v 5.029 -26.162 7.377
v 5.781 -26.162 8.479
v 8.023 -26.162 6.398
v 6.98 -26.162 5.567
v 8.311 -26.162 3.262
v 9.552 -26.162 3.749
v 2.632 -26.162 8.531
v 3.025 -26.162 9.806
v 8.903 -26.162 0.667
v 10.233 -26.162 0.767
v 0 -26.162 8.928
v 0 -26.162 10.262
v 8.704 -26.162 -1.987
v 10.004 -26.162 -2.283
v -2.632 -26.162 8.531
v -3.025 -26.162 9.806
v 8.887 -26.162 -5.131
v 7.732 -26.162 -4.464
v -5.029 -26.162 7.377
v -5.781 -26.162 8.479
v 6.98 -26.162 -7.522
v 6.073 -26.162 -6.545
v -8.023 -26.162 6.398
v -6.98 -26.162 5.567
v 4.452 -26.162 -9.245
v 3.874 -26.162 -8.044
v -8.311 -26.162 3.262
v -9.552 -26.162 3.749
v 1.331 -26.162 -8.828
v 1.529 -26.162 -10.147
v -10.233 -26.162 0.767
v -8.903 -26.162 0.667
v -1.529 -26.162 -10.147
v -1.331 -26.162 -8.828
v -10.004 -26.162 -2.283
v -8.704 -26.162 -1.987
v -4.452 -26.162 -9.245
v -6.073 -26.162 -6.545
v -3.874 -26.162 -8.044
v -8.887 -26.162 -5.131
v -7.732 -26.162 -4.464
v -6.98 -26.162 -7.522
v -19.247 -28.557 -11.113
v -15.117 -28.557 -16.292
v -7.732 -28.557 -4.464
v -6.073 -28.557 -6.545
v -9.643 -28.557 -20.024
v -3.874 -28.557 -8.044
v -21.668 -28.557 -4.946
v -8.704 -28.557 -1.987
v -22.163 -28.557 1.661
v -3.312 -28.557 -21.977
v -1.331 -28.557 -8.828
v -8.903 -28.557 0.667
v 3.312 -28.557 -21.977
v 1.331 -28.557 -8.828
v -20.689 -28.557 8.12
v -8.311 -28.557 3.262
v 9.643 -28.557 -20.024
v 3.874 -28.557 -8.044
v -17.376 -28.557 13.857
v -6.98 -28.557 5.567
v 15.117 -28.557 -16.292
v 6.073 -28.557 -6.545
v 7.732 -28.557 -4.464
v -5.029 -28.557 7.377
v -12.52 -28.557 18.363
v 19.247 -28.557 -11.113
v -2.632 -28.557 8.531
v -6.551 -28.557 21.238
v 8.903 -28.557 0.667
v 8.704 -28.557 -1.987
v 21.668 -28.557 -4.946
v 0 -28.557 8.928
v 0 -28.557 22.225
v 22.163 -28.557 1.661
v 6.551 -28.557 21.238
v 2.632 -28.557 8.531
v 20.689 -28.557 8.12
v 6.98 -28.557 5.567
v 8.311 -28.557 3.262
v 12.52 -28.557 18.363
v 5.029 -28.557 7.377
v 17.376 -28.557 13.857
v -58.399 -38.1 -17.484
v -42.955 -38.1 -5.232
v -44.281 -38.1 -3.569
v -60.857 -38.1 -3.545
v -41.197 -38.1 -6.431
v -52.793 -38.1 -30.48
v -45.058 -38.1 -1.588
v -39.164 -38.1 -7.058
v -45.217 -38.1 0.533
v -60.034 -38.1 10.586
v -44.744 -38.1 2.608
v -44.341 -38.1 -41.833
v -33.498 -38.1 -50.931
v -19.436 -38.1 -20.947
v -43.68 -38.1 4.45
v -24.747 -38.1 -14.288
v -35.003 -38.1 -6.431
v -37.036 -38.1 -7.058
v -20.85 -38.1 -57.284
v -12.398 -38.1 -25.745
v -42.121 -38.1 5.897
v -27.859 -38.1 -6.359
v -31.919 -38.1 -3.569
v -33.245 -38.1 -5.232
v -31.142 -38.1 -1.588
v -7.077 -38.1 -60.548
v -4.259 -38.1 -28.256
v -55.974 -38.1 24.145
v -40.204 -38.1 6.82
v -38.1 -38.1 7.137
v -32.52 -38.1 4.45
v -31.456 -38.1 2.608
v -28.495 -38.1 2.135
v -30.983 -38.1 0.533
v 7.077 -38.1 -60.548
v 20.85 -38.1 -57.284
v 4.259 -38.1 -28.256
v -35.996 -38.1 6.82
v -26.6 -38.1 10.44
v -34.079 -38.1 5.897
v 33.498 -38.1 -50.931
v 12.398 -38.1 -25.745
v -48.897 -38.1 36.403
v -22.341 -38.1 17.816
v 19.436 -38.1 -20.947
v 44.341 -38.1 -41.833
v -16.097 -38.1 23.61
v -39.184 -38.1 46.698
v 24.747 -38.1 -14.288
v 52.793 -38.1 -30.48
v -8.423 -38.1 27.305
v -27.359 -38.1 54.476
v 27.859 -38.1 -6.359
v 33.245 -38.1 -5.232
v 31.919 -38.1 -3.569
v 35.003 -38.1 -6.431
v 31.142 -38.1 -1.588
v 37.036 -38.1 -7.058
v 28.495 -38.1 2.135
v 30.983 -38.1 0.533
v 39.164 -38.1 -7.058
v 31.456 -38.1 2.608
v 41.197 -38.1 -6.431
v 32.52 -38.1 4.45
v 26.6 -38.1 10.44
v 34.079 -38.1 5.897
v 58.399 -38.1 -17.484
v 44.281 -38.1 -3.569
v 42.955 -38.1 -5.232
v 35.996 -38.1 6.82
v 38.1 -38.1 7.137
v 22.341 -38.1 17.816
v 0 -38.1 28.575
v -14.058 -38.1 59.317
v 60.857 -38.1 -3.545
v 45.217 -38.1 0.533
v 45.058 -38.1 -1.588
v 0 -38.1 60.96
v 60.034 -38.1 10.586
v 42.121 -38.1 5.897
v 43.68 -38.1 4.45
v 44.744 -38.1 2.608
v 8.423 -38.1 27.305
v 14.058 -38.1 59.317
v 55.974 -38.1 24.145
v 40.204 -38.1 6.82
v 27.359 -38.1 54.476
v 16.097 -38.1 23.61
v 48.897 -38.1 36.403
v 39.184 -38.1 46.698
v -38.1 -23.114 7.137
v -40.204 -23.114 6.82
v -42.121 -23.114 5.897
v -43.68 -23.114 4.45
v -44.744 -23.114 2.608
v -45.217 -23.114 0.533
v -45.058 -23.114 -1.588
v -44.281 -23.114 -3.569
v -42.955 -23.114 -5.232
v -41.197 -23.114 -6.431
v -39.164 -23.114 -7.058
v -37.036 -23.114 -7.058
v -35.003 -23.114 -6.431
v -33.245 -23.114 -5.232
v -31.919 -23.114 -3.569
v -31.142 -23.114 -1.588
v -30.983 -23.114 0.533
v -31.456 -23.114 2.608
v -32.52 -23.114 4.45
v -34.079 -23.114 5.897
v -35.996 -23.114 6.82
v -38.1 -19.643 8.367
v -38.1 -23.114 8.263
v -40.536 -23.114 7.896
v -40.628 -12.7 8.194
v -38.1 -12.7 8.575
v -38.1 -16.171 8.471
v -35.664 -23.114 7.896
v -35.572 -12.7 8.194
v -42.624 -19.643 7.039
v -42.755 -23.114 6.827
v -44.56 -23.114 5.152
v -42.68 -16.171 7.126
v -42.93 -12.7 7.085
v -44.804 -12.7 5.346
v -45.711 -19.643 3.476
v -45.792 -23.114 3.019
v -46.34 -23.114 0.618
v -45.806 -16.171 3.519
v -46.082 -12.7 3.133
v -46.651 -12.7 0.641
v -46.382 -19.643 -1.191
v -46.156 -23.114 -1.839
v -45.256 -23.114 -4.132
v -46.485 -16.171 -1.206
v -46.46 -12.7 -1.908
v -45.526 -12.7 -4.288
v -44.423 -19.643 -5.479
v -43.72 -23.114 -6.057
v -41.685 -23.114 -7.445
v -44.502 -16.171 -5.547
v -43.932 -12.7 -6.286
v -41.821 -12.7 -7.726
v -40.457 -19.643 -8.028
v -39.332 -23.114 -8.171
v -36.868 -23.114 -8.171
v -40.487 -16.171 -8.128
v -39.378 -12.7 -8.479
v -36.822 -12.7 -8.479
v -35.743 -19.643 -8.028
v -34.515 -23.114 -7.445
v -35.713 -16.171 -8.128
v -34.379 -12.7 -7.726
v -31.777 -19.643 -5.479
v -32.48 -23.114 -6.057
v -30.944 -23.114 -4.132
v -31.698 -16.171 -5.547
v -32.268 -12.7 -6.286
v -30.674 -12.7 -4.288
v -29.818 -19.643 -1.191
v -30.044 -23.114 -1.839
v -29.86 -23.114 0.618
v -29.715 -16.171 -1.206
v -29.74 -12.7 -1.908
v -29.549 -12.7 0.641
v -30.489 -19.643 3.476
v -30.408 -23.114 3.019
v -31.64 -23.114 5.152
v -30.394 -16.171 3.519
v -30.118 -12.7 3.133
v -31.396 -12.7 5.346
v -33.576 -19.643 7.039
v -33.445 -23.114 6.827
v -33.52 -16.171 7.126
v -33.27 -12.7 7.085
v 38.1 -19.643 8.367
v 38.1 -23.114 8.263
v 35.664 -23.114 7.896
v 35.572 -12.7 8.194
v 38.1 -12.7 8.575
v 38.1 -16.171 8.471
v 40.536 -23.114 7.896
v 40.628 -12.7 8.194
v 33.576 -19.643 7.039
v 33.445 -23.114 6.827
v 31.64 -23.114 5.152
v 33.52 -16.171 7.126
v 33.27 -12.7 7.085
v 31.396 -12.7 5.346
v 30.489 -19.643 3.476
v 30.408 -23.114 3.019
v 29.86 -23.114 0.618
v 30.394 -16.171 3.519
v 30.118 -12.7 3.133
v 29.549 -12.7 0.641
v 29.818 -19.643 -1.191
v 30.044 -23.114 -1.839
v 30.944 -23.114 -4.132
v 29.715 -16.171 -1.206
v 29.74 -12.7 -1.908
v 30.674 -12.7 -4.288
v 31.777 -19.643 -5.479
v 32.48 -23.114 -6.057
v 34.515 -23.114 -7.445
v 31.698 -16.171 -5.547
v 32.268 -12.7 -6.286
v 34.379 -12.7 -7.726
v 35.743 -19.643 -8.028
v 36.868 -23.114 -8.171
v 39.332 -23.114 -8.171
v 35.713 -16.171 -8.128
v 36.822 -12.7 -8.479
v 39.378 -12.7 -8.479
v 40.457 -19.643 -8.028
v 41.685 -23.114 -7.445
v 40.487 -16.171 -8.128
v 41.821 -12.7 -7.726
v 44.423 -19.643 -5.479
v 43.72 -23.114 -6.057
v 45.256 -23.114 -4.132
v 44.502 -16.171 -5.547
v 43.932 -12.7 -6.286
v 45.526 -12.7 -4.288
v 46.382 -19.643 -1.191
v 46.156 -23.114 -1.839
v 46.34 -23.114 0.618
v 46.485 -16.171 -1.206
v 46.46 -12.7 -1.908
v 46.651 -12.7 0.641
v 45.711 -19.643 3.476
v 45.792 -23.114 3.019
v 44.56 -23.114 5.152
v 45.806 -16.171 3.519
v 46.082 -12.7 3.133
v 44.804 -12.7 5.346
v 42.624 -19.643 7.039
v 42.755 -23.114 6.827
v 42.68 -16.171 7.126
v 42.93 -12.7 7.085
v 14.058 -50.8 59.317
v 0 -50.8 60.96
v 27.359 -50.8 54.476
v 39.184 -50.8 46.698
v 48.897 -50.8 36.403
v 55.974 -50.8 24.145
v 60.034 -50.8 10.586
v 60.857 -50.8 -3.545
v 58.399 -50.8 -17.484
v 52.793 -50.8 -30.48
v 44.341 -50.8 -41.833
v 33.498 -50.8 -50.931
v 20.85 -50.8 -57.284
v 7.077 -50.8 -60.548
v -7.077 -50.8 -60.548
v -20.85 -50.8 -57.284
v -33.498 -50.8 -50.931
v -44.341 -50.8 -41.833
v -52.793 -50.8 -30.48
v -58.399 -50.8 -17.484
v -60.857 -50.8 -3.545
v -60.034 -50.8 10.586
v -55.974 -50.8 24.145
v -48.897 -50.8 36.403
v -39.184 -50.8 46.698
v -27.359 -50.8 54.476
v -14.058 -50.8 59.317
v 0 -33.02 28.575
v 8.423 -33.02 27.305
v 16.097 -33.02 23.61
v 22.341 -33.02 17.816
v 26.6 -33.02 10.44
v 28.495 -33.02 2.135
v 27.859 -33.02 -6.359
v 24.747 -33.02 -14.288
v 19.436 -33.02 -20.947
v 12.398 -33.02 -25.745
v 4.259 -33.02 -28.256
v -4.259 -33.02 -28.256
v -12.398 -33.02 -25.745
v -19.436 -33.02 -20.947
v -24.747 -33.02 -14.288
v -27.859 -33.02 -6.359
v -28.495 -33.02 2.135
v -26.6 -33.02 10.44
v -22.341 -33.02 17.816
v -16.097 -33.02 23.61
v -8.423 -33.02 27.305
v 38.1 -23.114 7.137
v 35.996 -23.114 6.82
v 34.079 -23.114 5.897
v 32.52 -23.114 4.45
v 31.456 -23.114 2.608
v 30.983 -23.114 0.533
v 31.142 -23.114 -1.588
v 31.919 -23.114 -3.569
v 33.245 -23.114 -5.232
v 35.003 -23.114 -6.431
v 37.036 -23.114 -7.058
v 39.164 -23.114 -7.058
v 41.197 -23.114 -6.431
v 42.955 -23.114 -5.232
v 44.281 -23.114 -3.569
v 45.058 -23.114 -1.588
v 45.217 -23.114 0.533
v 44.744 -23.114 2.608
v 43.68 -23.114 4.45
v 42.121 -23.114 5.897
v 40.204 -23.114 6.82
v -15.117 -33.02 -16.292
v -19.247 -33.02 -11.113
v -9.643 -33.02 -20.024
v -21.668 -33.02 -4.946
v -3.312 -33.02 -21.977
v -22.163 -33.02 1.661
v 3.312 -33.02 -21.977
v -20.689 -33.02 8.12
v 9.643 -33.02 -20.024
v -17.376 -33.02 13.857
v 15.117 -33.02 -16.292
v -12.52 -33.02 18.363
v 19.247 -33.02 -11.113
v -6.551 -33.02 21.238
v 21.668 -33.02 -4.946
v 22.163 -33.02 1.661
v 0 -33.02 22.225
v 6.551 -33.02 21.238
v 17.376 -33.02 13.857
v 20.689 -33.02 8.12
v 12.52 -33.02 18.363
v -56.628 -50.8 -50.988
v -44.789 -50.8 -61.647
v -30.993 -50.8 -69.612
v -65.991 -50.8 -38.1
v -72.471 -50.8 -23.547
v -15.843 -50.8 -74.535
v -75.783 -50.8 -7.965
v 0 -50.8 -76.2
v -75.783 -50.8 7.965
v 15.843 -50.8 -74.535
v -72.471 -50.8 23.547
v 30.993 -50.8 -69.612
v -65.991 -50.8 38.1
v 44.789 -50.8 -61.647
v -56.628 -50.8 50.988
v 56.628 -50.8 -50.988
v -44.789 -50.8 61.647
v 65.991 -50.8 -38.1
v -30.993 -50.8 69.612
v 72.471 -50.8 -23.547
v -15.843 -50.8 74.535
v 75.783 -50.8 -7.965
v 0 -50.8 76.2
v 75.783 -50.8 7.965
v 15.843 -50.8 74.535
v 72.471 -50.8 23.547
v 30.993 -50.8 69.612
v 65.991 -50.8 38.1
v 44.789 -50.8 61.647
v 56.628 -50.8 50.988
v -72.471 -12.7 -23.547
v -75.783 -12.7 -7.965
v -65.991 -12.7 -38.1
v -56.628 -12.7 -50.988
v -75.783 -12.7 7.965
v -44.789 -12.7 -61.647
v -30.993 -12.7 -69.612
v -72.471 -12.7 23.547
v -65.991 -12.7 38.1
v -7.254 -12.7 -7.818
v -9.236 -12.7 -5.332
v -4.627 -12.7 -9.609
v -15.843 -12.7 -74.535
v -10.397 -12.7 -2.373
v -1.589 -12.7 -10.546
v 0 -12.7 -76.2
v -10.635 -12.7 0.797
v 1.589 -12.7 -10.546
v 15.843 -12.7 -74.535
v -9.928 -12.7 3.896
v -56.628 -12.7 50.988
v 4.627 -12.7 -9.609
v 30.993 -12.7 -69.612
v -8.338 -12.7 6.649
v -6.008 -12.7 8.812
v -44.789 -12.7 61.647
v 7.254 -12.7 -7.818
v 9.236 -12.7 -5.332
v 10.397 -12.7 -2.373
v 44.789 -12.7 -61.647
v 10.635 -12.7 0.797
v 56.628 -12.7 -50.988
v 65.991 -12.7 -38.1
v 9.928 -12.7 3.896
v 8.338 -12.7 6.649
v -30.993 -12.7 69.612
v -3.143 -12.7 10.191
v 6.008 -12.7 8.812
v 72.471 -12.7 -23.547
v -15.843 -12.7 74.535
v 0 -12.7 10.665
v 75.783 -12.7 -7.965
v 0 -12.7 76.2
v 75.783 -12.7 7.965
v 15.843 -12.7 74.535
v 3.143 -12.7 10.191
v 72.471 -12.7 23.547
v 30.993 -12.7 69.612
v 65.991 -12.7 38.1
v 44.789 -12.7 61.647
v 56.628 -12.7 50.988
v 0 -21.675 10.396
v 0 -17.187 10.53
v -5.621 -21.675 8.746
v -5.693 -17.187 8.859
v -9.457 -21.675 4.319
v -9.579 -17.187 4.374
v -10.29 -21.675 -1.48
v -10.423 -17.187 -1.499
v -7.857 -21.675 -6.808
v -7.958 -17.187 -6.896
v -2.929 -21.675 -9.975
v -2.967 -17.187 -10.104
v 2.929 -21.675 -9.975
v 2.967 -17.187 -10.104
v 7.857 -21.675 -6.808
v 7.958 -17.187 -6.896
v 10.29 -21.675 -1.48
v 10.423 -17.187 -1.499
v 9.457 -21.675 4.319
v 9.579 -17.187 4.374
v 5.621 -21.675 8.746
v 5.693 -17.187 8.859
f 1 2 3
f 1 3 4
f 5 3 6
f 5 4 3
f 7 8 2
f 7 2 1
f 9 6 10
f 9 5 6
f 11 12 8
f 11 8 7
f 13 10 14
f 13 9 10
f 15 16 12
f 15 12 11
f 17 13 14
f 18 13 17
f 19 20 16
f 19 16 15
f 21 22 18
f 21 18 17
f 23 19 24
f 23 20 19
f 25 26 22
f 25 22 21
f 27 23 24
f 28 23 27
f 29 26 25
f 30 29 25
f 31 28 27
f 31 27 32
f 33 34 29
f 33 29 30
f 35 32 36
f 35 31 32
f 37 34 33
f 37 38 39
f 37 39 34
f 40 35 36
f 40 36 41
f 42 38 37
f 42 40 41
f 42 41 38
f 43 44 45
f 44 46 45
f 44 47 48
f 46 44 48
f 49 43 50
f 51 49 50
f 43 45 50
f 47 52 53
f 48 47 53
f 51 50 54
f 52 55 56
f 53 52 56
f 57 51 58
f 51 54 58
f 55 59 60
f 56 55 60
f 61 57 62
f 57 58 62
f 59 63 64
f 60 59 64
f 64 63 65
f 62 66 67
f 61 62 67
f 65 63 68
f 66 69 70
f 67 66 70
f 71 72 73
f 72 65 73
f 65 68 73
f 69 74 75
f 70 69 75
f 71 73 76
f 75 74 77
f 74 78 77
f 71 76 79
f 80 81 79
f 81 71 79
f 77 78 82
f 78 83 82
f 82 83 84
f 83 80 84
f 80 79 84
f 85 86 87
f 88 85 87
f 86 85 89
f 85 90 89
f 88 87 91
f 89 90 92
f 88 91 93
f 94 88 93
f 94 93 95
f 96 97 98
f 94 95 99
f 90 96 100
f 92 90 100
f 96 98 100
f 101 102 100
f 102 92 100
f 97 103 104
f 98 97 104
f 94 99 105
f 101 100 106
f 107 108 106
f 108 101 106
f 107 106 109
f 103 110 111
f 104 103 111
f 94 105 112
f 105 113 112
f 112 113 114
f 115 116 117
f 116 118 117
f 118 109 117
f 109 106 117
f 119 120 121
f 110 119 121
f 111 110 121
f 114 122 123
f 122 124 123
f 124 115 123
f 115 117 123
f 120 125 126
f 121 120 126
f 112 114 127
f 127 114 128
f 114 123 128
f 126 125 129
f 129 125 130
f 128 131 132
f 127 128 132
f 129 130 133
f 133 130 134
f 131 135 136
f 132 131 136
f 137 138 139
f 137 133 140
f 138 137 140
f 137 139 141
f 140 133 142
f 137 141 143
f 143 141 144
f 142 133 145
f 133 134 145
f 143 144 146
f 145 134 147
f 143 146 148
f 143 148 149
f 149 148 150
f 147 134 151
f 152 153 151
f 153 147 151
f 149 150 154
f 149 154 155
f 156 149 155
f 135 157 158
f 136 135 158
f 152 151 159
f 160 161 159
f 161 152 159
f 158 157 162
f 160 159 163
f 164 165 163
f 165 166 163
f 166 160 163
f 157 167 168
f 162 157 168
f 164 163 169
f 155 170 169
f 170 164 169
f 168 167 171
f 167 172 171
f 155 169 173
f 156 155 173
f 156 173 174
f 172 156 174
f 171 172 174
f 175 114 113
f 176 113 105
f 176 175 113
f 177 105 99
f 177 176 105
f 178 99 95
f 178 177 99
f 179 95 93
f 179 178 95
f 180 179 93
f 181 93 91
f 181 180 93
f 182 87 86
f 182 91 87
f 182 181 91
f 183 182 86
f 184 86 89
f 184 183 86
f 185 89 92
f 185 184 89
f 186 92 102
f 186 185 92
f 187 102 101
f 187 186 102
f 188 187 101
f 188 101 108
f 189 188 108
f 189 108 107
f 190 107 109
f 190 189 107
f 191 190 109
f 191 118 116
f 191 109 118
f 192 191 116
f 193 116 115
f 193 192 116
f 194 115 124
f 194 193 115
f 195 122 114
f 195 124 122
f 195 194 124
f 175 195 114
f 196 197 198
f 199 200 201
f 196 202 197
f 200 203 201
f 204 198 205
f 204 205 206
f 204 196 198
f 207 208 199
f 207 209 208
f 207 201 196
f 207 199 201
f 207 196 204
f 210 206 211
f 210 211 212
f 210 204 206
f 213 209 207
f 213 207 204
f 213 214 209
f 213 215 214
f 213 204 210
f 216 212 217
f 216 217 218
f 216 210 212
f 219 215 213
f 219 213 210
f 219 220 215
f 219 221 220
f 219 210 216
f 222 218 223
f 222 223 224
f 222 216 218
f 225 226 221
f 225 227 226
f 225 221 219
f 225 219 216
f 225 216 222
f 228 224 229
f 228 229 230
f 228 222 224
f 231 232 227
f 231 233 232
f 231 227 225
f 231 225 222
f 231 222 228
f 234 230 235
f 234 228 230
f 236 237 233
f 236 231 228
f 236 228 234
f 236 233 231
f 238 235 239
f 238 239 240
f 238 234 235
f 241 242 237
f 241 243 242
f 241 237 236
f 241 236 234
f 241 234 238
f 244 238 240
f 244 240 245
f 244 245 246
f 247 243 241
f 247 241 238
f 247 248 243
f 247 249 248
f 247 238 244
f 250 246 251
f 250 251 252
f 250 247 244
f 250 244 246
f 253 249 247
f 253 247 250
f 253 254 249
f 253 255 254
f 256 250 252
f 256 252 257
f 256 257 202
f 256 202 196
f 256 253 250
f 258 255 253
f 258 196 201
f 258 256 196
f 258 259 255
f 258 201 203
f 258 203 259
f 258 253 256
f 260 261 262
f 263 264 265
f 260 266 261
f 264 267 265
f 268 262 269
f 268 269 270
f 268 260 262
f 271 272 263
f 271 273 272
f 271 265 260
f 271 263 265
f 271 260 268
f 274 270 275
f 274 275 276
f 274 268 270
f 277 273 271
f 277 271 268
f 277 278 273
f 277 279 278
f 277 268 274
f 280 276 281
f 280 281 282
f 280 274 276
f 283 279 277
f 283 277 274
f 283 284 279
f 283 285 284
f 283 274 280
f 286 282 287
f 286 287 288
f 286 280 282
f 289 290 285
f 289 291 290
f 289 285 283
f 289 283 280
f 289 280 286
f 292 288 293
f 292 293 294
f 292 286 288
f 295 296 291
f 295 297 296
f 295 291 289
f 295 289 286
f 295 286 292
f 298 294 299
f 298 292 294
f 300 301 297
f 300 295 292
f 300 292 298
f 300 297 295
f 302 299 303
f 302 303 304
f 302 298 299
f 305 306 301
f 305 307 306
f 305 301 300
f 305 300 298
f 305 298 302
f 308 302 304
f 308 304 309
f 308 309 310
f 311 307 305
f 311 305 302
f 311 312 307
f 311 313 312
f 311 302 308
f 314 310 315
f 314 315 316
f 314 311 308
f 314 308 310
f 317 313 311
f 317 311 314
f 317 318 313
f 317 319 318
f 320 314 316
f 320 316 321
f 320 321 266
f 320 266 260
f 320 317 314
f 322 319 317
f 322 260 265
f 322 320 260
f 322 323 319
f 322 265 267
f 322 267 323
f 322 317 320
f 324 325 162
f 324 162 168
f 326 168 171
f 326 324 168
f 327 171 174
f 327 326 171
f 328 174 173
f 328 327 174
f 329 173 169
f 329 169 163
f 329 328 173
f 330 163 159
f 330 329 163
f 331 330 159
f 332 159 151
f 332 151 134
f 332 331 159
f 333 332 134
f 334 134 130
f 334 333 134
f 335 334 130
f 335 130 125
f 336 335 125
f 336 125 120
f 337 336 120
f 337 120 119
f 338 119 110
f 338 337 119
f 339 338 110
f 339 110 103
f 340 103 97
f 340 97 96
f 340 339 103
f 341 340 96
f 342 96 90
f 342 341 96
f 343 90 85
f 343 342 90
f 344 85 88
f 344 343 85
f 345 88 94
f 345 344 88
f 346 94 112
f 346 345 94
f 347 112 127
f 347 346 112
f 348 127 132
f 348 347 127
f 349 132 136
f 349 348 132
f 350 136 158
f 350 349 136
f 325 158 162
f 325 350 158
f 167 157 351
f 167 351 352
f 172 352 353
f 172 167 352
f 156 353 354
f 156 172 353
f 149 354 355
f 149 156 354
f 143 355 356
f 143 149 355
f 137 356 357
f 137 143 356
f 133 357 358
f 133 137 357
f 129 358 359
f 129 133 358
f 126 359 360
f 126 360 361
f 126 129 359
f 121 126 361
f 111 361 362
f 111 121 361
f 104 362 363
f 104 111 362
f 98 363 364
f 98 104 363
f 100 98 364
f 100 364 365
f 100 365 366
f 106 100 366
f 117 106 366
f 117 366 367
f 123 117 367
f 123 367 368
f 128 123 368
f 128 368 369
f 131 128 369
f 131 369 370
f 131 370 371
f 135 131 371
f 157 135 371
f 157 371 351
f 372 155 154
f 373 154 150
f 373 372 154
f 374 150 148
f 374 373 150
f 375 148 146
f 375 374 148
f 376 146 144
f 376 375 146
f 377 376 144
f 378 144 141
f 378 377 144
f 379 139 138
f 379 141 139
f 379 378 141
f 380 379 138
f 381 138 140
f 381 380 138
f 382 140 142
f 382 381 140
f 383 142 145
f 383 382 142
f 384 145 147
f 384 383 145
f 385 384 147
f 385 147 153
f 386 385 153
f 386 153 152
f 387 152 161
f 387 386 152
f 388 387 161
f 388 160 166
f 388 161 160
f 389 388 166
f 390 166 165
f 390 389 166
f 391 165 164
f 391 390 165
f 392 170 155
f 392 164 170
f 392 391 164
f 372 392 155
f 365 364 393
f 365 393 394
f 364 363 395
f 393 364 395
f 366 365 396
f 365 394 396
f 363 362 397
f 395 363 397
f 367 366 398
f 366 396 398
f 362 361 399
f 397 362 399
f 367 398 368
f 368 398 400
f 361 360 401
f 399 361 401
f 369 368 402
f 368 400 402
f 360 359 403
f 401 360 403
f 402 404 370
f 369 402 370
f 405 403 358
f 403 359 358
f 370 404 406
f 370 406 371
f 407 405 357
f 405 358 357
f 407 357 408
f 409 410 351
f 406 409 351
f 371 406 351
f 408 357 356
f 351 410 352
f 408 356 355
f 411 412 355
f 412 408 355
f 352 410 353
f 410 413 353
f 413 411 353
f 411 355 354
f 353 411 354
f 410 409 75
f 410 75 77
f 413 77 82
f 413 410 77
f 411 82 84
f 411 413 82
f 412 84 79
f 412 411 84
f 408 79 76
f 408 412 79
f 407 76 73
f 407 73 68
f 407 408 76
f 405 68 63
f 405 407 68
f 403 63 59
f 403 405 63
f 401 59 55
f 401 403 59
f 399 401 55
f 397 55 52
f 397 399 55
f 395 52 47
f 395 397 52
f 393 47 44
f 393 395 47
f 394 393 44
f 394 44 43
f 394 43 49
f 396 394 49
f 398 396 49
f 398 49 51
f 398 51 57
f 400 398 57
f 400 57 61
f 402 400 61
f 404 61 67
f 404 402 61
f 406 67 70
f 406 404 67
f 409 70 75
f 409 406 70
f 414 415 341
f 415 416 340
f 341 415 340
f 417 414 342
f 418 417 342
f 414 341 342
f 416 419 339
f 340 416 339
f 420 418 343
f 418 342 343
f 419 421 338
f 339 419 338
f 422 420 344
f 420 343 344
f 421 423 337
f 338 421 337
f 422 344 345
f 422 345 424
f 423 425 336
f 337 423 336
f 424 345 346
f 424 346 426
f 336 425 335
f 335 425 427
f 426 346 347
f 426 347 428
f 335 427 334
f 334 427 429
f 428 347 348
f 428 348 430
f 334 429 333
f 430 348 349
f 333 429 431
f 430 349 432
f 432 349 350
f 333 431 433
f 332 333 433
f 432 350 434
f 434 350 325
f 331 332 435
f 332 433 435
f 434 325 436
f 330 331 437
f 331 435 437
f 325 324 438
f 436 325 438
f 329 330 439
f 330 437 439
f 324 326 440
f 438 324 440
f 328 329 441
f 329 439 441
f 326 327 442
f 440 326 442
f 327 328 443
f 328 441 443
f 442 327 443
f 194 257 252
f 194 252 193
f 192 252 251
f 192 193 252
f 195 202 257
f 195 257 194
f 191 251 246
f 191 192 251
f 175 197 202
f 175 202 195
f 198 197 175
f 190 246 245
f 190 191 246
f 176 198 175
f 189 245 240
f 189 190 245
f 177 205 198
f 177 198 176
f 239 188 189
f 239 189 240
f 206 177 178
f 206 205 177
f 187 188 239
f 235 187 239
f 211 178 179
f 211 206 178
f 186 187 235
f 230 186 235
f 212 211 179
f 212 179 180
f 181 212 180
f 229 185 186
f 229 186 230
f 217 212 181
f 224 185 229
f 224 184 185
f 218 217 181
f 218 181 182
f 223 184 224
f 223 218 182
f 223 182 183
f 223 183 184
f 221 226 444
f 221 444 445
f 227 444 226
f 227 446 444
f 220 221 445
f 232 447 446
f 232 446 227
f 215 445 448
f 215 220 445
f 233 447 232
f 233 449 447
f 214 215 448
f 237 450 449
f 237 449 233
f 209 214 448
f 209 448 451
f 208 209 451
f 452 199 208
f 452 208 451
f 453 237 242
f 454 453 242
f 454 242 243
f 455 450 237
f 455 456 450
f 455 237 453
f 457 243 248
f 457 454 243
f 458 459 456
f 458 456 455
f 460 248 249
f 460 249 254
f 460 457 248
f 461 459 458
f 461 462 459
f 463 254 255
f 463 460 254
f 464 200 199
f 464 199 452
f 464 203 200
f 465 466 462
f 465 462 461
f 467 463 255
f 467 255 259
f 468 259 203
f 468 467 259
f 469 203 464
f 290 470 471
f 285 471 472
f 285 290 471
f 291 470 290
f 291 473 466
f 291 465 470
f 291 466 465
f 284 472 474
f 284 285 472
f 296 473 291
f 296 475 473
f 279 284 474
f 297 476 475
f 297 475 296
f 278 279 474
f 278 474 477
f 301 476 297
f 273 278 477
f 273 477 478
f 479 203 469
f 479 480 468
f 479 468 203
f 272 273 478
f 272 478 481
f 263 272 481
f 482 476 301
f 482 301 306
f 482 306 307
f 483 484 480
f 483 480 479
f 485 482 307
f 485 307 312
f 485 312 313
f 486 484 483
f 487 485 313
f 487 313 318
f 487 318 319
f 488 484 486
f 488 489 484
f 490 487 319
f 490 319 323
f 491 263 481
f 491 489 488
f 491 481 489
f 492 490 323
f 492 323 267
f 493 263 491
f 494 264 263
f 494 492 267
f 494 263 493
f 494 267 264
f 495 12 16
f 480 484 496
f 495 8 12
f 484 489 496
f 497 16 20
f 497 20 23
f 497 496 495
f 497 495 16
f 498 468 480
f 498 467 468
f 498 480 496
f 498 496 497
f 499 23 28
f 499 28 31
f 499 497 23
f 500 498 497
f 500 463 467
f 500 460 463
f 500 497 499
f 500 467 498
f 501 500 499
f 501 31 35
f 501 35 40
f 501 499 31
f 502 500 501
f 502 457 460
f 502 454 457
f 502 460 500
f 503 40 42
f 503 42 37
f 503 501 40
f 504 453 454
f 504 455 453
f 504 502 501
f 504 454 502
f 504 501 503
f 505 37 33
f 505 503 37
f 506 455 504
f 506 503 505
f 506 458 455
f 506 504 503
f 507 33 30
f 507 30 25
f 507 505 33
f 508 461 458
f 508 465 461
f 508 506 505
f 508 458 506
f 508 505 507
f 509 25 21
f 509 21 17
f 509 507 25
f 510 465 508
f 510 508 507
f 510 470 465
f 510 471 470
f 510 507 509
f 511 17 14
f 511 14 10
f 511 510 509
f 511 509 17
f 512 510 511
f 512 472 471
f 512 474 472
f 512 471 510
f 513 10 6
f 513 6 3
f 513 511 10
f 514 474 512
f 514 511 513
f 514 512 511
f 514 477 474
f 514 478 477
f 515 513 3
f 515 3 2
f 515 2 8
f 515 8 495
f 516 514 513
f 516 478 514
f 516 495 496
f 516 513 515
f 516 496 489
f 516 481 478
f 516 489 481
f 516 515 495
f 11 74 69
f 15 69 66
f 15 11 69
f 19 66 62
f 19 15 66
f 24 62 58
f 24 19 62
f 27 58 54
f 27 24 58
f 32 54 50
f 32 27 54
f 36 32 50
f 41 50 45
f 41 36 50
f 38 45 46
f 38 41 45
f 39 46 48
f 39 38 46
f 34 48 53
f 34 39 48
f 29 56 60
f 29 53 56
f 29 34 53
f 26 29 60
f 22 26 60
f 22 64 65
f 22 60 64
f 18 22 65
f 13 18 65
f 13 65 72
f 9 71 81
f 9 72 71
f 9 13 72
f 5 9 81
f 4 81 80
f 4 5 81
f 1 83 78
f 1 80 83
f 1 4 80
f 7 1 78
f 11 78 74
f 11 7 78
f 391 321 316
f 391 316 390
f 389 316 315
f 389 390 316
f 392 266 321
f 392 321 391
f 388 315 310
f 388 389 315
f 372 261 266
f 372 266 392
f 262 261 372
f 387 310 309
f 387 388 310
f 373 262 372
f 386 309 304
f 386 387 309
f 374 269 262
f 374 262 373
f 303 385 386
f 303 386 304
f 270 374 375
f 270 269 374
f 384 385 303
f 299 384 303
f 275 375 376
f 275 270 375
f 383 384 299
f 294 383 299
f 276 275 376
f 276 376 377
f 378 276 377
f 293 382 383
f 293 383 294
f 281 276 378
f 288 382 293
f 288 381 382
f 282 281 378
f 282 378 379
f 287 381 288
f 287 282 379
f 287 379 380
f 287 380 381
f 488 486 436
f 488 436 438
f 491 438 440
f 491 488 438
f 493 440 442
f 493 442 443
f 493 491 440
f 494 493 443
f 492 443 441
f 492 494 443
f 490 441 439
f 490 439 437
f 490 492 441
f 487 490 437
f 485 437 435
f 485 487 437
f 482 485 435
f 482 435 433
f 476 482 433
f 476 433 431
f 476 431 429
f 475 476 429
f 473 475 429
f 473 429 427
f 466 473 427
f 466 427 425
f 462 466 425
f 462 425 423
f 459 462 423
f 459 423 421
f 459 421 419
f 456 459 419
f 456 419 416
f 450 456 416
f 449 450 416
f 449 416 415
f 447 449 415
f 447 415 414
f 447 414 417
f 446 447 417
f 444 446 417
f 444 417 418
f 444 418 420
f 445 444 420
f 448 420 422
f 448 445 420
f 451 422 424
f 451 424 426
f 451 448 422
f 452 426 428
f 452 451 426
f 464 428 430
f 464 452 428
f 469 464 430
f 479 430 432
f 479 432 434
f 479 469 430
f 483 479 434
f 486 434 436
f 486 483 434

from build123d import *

# Parameters (mm, degrees)
SKETCH1_R                                      = 76.2
BILLET_DEPTH                                   = 50.8
SKETCH3_R                                      = 28.575
LOX_PLATE_DEPTH                                = 17.78
SKETCH5_R                                      = 22.225
LOX_DOME_DEPTH                                 = 4.46278
SKETCH7_R                                      = 76.2
TOP_MILL_DEPTH                                 = 12.7
SKETCH12_R                                     = 60.96
KEROSENE_PLATE_DEPTH                           = 12.7
KEROSENE_INLET_3_8_NPT_TAPPED_HOLE1_AT_2_COUNT = 2
KEROSENE_INLET_3_8_NPT_TAPPED_HOLE1_AT_2_PITCH = 76.2


with BuildPart() as part:
    # Sketch1 → Billet (new body)
    with BuildSketch(Plane(origin=(0, 0, 0), x_dir=(1, 0, 0), z_dir=(0, 1, 0))):
        Circle(SKETCH1_R)
    extrude(amount=-BILLET_DEPTH)

    # Sketch3 → Lox Plate (cut)
    with BuildSketch(Plane(origin=(0, -50.8, 0), x_dir=(1, 0, 0), z_dir=(0, 1, 0))):
        Circle(SKETCH3_R)
    extrude(amount=LOX_PLATE_DEPTH, mode=Mode.SUBTRACT)

    # Sketch5 → Lox Dome (cut)
    with BuildSketch(Plane(origin=(0, -33.02, 0), x_dir=(1, 0, 0), z_dir=(0, 1, 0))):
        Circle(SKETCH5_R)
    extrude(amount=LOX_DOME_DEPTH, mode=Mode.SUBTRACT)

    # Sketch7 → Top Mill (cut)
    with BuildSketch(Plane(origin=(0, 0, 0), x_dir=(1, 0, 0), z_dir=(0, 1, 0))):
        Circle(SKETCH7_R)
    extrude(amount=-TOP_MILL_DEPTH, mode=Mode.SUBTRACT)

    # Sketch12 → Kerosene Plate (cut)
    with BuildSketch(Plane(origin=(0, -50.8, 0), x_dir=(1, 0, 0), z_dir=(0, 1, 0))):
        Circle(SKETCH12_R)
    extrude(amount=KEROSENE_PLATE_DEPTH, mode=Mode.SUBTRACT)

    # Sketch21 → Lox Inlet-1/2 NPT Tapped Hole3 (revolve, cut)
    with BuildSketch(Plane(origin=(0, -12.7, 0), x_dir=(0, 0, 1), z_dir=(1, 0, 0))):
        Polygon((0, 0), (0, 38.1), (8.9281, 38.1), (8.9281, 13.462), (10.261665792, 13.462), (10.6647361, 0), align=None)
    revolve(axis=Axis((0, -6.35, 0), (0, -1, 0)), mode=Mode.SUBTRACT)

    # Sketch25 → Kerosene Inlet-3/8 NPT Tapped Hole1 (revolve, cut)
    with BuildSketch(Plane(origin=(-38.1, -12.7, 0), x_dir=(0, 0, 1), z_dir=(1, 0, 0))):
        Polygon((0, 0), (0, 38.1), (7.1374, 38.1), (7.1374, 10.414), (8.263205494, 10.414), (8.5750146, 0), align=None)
    kerosene_inlet_3_8_npt_tapped_hole1 = revolve(axis=Axis((-38.1, -6.35, 0), (0, -1, 0)), mode=Mode.SUBTRACT)

    # Kerosene Inlet-3/8 NPT Tapped Hole1 at 2: Kerosene Inlet-3/8 NPT Tapped Hole1 ×2
    with Locations(*[(i * KEROSENE_INLET_3_8_NPT_TAPPED_HOLE1_AT_2_PITCH, 0, 0) for i in range(1, KEROSENE_INLET_3_8_NPT_TAPPED_HOLE1_AT_2_COUNT)]):
        add(kerosene_inlet_3_8_npt_tapped_hole1, mode=Mode.SUBTRACT)


solid = part.part
